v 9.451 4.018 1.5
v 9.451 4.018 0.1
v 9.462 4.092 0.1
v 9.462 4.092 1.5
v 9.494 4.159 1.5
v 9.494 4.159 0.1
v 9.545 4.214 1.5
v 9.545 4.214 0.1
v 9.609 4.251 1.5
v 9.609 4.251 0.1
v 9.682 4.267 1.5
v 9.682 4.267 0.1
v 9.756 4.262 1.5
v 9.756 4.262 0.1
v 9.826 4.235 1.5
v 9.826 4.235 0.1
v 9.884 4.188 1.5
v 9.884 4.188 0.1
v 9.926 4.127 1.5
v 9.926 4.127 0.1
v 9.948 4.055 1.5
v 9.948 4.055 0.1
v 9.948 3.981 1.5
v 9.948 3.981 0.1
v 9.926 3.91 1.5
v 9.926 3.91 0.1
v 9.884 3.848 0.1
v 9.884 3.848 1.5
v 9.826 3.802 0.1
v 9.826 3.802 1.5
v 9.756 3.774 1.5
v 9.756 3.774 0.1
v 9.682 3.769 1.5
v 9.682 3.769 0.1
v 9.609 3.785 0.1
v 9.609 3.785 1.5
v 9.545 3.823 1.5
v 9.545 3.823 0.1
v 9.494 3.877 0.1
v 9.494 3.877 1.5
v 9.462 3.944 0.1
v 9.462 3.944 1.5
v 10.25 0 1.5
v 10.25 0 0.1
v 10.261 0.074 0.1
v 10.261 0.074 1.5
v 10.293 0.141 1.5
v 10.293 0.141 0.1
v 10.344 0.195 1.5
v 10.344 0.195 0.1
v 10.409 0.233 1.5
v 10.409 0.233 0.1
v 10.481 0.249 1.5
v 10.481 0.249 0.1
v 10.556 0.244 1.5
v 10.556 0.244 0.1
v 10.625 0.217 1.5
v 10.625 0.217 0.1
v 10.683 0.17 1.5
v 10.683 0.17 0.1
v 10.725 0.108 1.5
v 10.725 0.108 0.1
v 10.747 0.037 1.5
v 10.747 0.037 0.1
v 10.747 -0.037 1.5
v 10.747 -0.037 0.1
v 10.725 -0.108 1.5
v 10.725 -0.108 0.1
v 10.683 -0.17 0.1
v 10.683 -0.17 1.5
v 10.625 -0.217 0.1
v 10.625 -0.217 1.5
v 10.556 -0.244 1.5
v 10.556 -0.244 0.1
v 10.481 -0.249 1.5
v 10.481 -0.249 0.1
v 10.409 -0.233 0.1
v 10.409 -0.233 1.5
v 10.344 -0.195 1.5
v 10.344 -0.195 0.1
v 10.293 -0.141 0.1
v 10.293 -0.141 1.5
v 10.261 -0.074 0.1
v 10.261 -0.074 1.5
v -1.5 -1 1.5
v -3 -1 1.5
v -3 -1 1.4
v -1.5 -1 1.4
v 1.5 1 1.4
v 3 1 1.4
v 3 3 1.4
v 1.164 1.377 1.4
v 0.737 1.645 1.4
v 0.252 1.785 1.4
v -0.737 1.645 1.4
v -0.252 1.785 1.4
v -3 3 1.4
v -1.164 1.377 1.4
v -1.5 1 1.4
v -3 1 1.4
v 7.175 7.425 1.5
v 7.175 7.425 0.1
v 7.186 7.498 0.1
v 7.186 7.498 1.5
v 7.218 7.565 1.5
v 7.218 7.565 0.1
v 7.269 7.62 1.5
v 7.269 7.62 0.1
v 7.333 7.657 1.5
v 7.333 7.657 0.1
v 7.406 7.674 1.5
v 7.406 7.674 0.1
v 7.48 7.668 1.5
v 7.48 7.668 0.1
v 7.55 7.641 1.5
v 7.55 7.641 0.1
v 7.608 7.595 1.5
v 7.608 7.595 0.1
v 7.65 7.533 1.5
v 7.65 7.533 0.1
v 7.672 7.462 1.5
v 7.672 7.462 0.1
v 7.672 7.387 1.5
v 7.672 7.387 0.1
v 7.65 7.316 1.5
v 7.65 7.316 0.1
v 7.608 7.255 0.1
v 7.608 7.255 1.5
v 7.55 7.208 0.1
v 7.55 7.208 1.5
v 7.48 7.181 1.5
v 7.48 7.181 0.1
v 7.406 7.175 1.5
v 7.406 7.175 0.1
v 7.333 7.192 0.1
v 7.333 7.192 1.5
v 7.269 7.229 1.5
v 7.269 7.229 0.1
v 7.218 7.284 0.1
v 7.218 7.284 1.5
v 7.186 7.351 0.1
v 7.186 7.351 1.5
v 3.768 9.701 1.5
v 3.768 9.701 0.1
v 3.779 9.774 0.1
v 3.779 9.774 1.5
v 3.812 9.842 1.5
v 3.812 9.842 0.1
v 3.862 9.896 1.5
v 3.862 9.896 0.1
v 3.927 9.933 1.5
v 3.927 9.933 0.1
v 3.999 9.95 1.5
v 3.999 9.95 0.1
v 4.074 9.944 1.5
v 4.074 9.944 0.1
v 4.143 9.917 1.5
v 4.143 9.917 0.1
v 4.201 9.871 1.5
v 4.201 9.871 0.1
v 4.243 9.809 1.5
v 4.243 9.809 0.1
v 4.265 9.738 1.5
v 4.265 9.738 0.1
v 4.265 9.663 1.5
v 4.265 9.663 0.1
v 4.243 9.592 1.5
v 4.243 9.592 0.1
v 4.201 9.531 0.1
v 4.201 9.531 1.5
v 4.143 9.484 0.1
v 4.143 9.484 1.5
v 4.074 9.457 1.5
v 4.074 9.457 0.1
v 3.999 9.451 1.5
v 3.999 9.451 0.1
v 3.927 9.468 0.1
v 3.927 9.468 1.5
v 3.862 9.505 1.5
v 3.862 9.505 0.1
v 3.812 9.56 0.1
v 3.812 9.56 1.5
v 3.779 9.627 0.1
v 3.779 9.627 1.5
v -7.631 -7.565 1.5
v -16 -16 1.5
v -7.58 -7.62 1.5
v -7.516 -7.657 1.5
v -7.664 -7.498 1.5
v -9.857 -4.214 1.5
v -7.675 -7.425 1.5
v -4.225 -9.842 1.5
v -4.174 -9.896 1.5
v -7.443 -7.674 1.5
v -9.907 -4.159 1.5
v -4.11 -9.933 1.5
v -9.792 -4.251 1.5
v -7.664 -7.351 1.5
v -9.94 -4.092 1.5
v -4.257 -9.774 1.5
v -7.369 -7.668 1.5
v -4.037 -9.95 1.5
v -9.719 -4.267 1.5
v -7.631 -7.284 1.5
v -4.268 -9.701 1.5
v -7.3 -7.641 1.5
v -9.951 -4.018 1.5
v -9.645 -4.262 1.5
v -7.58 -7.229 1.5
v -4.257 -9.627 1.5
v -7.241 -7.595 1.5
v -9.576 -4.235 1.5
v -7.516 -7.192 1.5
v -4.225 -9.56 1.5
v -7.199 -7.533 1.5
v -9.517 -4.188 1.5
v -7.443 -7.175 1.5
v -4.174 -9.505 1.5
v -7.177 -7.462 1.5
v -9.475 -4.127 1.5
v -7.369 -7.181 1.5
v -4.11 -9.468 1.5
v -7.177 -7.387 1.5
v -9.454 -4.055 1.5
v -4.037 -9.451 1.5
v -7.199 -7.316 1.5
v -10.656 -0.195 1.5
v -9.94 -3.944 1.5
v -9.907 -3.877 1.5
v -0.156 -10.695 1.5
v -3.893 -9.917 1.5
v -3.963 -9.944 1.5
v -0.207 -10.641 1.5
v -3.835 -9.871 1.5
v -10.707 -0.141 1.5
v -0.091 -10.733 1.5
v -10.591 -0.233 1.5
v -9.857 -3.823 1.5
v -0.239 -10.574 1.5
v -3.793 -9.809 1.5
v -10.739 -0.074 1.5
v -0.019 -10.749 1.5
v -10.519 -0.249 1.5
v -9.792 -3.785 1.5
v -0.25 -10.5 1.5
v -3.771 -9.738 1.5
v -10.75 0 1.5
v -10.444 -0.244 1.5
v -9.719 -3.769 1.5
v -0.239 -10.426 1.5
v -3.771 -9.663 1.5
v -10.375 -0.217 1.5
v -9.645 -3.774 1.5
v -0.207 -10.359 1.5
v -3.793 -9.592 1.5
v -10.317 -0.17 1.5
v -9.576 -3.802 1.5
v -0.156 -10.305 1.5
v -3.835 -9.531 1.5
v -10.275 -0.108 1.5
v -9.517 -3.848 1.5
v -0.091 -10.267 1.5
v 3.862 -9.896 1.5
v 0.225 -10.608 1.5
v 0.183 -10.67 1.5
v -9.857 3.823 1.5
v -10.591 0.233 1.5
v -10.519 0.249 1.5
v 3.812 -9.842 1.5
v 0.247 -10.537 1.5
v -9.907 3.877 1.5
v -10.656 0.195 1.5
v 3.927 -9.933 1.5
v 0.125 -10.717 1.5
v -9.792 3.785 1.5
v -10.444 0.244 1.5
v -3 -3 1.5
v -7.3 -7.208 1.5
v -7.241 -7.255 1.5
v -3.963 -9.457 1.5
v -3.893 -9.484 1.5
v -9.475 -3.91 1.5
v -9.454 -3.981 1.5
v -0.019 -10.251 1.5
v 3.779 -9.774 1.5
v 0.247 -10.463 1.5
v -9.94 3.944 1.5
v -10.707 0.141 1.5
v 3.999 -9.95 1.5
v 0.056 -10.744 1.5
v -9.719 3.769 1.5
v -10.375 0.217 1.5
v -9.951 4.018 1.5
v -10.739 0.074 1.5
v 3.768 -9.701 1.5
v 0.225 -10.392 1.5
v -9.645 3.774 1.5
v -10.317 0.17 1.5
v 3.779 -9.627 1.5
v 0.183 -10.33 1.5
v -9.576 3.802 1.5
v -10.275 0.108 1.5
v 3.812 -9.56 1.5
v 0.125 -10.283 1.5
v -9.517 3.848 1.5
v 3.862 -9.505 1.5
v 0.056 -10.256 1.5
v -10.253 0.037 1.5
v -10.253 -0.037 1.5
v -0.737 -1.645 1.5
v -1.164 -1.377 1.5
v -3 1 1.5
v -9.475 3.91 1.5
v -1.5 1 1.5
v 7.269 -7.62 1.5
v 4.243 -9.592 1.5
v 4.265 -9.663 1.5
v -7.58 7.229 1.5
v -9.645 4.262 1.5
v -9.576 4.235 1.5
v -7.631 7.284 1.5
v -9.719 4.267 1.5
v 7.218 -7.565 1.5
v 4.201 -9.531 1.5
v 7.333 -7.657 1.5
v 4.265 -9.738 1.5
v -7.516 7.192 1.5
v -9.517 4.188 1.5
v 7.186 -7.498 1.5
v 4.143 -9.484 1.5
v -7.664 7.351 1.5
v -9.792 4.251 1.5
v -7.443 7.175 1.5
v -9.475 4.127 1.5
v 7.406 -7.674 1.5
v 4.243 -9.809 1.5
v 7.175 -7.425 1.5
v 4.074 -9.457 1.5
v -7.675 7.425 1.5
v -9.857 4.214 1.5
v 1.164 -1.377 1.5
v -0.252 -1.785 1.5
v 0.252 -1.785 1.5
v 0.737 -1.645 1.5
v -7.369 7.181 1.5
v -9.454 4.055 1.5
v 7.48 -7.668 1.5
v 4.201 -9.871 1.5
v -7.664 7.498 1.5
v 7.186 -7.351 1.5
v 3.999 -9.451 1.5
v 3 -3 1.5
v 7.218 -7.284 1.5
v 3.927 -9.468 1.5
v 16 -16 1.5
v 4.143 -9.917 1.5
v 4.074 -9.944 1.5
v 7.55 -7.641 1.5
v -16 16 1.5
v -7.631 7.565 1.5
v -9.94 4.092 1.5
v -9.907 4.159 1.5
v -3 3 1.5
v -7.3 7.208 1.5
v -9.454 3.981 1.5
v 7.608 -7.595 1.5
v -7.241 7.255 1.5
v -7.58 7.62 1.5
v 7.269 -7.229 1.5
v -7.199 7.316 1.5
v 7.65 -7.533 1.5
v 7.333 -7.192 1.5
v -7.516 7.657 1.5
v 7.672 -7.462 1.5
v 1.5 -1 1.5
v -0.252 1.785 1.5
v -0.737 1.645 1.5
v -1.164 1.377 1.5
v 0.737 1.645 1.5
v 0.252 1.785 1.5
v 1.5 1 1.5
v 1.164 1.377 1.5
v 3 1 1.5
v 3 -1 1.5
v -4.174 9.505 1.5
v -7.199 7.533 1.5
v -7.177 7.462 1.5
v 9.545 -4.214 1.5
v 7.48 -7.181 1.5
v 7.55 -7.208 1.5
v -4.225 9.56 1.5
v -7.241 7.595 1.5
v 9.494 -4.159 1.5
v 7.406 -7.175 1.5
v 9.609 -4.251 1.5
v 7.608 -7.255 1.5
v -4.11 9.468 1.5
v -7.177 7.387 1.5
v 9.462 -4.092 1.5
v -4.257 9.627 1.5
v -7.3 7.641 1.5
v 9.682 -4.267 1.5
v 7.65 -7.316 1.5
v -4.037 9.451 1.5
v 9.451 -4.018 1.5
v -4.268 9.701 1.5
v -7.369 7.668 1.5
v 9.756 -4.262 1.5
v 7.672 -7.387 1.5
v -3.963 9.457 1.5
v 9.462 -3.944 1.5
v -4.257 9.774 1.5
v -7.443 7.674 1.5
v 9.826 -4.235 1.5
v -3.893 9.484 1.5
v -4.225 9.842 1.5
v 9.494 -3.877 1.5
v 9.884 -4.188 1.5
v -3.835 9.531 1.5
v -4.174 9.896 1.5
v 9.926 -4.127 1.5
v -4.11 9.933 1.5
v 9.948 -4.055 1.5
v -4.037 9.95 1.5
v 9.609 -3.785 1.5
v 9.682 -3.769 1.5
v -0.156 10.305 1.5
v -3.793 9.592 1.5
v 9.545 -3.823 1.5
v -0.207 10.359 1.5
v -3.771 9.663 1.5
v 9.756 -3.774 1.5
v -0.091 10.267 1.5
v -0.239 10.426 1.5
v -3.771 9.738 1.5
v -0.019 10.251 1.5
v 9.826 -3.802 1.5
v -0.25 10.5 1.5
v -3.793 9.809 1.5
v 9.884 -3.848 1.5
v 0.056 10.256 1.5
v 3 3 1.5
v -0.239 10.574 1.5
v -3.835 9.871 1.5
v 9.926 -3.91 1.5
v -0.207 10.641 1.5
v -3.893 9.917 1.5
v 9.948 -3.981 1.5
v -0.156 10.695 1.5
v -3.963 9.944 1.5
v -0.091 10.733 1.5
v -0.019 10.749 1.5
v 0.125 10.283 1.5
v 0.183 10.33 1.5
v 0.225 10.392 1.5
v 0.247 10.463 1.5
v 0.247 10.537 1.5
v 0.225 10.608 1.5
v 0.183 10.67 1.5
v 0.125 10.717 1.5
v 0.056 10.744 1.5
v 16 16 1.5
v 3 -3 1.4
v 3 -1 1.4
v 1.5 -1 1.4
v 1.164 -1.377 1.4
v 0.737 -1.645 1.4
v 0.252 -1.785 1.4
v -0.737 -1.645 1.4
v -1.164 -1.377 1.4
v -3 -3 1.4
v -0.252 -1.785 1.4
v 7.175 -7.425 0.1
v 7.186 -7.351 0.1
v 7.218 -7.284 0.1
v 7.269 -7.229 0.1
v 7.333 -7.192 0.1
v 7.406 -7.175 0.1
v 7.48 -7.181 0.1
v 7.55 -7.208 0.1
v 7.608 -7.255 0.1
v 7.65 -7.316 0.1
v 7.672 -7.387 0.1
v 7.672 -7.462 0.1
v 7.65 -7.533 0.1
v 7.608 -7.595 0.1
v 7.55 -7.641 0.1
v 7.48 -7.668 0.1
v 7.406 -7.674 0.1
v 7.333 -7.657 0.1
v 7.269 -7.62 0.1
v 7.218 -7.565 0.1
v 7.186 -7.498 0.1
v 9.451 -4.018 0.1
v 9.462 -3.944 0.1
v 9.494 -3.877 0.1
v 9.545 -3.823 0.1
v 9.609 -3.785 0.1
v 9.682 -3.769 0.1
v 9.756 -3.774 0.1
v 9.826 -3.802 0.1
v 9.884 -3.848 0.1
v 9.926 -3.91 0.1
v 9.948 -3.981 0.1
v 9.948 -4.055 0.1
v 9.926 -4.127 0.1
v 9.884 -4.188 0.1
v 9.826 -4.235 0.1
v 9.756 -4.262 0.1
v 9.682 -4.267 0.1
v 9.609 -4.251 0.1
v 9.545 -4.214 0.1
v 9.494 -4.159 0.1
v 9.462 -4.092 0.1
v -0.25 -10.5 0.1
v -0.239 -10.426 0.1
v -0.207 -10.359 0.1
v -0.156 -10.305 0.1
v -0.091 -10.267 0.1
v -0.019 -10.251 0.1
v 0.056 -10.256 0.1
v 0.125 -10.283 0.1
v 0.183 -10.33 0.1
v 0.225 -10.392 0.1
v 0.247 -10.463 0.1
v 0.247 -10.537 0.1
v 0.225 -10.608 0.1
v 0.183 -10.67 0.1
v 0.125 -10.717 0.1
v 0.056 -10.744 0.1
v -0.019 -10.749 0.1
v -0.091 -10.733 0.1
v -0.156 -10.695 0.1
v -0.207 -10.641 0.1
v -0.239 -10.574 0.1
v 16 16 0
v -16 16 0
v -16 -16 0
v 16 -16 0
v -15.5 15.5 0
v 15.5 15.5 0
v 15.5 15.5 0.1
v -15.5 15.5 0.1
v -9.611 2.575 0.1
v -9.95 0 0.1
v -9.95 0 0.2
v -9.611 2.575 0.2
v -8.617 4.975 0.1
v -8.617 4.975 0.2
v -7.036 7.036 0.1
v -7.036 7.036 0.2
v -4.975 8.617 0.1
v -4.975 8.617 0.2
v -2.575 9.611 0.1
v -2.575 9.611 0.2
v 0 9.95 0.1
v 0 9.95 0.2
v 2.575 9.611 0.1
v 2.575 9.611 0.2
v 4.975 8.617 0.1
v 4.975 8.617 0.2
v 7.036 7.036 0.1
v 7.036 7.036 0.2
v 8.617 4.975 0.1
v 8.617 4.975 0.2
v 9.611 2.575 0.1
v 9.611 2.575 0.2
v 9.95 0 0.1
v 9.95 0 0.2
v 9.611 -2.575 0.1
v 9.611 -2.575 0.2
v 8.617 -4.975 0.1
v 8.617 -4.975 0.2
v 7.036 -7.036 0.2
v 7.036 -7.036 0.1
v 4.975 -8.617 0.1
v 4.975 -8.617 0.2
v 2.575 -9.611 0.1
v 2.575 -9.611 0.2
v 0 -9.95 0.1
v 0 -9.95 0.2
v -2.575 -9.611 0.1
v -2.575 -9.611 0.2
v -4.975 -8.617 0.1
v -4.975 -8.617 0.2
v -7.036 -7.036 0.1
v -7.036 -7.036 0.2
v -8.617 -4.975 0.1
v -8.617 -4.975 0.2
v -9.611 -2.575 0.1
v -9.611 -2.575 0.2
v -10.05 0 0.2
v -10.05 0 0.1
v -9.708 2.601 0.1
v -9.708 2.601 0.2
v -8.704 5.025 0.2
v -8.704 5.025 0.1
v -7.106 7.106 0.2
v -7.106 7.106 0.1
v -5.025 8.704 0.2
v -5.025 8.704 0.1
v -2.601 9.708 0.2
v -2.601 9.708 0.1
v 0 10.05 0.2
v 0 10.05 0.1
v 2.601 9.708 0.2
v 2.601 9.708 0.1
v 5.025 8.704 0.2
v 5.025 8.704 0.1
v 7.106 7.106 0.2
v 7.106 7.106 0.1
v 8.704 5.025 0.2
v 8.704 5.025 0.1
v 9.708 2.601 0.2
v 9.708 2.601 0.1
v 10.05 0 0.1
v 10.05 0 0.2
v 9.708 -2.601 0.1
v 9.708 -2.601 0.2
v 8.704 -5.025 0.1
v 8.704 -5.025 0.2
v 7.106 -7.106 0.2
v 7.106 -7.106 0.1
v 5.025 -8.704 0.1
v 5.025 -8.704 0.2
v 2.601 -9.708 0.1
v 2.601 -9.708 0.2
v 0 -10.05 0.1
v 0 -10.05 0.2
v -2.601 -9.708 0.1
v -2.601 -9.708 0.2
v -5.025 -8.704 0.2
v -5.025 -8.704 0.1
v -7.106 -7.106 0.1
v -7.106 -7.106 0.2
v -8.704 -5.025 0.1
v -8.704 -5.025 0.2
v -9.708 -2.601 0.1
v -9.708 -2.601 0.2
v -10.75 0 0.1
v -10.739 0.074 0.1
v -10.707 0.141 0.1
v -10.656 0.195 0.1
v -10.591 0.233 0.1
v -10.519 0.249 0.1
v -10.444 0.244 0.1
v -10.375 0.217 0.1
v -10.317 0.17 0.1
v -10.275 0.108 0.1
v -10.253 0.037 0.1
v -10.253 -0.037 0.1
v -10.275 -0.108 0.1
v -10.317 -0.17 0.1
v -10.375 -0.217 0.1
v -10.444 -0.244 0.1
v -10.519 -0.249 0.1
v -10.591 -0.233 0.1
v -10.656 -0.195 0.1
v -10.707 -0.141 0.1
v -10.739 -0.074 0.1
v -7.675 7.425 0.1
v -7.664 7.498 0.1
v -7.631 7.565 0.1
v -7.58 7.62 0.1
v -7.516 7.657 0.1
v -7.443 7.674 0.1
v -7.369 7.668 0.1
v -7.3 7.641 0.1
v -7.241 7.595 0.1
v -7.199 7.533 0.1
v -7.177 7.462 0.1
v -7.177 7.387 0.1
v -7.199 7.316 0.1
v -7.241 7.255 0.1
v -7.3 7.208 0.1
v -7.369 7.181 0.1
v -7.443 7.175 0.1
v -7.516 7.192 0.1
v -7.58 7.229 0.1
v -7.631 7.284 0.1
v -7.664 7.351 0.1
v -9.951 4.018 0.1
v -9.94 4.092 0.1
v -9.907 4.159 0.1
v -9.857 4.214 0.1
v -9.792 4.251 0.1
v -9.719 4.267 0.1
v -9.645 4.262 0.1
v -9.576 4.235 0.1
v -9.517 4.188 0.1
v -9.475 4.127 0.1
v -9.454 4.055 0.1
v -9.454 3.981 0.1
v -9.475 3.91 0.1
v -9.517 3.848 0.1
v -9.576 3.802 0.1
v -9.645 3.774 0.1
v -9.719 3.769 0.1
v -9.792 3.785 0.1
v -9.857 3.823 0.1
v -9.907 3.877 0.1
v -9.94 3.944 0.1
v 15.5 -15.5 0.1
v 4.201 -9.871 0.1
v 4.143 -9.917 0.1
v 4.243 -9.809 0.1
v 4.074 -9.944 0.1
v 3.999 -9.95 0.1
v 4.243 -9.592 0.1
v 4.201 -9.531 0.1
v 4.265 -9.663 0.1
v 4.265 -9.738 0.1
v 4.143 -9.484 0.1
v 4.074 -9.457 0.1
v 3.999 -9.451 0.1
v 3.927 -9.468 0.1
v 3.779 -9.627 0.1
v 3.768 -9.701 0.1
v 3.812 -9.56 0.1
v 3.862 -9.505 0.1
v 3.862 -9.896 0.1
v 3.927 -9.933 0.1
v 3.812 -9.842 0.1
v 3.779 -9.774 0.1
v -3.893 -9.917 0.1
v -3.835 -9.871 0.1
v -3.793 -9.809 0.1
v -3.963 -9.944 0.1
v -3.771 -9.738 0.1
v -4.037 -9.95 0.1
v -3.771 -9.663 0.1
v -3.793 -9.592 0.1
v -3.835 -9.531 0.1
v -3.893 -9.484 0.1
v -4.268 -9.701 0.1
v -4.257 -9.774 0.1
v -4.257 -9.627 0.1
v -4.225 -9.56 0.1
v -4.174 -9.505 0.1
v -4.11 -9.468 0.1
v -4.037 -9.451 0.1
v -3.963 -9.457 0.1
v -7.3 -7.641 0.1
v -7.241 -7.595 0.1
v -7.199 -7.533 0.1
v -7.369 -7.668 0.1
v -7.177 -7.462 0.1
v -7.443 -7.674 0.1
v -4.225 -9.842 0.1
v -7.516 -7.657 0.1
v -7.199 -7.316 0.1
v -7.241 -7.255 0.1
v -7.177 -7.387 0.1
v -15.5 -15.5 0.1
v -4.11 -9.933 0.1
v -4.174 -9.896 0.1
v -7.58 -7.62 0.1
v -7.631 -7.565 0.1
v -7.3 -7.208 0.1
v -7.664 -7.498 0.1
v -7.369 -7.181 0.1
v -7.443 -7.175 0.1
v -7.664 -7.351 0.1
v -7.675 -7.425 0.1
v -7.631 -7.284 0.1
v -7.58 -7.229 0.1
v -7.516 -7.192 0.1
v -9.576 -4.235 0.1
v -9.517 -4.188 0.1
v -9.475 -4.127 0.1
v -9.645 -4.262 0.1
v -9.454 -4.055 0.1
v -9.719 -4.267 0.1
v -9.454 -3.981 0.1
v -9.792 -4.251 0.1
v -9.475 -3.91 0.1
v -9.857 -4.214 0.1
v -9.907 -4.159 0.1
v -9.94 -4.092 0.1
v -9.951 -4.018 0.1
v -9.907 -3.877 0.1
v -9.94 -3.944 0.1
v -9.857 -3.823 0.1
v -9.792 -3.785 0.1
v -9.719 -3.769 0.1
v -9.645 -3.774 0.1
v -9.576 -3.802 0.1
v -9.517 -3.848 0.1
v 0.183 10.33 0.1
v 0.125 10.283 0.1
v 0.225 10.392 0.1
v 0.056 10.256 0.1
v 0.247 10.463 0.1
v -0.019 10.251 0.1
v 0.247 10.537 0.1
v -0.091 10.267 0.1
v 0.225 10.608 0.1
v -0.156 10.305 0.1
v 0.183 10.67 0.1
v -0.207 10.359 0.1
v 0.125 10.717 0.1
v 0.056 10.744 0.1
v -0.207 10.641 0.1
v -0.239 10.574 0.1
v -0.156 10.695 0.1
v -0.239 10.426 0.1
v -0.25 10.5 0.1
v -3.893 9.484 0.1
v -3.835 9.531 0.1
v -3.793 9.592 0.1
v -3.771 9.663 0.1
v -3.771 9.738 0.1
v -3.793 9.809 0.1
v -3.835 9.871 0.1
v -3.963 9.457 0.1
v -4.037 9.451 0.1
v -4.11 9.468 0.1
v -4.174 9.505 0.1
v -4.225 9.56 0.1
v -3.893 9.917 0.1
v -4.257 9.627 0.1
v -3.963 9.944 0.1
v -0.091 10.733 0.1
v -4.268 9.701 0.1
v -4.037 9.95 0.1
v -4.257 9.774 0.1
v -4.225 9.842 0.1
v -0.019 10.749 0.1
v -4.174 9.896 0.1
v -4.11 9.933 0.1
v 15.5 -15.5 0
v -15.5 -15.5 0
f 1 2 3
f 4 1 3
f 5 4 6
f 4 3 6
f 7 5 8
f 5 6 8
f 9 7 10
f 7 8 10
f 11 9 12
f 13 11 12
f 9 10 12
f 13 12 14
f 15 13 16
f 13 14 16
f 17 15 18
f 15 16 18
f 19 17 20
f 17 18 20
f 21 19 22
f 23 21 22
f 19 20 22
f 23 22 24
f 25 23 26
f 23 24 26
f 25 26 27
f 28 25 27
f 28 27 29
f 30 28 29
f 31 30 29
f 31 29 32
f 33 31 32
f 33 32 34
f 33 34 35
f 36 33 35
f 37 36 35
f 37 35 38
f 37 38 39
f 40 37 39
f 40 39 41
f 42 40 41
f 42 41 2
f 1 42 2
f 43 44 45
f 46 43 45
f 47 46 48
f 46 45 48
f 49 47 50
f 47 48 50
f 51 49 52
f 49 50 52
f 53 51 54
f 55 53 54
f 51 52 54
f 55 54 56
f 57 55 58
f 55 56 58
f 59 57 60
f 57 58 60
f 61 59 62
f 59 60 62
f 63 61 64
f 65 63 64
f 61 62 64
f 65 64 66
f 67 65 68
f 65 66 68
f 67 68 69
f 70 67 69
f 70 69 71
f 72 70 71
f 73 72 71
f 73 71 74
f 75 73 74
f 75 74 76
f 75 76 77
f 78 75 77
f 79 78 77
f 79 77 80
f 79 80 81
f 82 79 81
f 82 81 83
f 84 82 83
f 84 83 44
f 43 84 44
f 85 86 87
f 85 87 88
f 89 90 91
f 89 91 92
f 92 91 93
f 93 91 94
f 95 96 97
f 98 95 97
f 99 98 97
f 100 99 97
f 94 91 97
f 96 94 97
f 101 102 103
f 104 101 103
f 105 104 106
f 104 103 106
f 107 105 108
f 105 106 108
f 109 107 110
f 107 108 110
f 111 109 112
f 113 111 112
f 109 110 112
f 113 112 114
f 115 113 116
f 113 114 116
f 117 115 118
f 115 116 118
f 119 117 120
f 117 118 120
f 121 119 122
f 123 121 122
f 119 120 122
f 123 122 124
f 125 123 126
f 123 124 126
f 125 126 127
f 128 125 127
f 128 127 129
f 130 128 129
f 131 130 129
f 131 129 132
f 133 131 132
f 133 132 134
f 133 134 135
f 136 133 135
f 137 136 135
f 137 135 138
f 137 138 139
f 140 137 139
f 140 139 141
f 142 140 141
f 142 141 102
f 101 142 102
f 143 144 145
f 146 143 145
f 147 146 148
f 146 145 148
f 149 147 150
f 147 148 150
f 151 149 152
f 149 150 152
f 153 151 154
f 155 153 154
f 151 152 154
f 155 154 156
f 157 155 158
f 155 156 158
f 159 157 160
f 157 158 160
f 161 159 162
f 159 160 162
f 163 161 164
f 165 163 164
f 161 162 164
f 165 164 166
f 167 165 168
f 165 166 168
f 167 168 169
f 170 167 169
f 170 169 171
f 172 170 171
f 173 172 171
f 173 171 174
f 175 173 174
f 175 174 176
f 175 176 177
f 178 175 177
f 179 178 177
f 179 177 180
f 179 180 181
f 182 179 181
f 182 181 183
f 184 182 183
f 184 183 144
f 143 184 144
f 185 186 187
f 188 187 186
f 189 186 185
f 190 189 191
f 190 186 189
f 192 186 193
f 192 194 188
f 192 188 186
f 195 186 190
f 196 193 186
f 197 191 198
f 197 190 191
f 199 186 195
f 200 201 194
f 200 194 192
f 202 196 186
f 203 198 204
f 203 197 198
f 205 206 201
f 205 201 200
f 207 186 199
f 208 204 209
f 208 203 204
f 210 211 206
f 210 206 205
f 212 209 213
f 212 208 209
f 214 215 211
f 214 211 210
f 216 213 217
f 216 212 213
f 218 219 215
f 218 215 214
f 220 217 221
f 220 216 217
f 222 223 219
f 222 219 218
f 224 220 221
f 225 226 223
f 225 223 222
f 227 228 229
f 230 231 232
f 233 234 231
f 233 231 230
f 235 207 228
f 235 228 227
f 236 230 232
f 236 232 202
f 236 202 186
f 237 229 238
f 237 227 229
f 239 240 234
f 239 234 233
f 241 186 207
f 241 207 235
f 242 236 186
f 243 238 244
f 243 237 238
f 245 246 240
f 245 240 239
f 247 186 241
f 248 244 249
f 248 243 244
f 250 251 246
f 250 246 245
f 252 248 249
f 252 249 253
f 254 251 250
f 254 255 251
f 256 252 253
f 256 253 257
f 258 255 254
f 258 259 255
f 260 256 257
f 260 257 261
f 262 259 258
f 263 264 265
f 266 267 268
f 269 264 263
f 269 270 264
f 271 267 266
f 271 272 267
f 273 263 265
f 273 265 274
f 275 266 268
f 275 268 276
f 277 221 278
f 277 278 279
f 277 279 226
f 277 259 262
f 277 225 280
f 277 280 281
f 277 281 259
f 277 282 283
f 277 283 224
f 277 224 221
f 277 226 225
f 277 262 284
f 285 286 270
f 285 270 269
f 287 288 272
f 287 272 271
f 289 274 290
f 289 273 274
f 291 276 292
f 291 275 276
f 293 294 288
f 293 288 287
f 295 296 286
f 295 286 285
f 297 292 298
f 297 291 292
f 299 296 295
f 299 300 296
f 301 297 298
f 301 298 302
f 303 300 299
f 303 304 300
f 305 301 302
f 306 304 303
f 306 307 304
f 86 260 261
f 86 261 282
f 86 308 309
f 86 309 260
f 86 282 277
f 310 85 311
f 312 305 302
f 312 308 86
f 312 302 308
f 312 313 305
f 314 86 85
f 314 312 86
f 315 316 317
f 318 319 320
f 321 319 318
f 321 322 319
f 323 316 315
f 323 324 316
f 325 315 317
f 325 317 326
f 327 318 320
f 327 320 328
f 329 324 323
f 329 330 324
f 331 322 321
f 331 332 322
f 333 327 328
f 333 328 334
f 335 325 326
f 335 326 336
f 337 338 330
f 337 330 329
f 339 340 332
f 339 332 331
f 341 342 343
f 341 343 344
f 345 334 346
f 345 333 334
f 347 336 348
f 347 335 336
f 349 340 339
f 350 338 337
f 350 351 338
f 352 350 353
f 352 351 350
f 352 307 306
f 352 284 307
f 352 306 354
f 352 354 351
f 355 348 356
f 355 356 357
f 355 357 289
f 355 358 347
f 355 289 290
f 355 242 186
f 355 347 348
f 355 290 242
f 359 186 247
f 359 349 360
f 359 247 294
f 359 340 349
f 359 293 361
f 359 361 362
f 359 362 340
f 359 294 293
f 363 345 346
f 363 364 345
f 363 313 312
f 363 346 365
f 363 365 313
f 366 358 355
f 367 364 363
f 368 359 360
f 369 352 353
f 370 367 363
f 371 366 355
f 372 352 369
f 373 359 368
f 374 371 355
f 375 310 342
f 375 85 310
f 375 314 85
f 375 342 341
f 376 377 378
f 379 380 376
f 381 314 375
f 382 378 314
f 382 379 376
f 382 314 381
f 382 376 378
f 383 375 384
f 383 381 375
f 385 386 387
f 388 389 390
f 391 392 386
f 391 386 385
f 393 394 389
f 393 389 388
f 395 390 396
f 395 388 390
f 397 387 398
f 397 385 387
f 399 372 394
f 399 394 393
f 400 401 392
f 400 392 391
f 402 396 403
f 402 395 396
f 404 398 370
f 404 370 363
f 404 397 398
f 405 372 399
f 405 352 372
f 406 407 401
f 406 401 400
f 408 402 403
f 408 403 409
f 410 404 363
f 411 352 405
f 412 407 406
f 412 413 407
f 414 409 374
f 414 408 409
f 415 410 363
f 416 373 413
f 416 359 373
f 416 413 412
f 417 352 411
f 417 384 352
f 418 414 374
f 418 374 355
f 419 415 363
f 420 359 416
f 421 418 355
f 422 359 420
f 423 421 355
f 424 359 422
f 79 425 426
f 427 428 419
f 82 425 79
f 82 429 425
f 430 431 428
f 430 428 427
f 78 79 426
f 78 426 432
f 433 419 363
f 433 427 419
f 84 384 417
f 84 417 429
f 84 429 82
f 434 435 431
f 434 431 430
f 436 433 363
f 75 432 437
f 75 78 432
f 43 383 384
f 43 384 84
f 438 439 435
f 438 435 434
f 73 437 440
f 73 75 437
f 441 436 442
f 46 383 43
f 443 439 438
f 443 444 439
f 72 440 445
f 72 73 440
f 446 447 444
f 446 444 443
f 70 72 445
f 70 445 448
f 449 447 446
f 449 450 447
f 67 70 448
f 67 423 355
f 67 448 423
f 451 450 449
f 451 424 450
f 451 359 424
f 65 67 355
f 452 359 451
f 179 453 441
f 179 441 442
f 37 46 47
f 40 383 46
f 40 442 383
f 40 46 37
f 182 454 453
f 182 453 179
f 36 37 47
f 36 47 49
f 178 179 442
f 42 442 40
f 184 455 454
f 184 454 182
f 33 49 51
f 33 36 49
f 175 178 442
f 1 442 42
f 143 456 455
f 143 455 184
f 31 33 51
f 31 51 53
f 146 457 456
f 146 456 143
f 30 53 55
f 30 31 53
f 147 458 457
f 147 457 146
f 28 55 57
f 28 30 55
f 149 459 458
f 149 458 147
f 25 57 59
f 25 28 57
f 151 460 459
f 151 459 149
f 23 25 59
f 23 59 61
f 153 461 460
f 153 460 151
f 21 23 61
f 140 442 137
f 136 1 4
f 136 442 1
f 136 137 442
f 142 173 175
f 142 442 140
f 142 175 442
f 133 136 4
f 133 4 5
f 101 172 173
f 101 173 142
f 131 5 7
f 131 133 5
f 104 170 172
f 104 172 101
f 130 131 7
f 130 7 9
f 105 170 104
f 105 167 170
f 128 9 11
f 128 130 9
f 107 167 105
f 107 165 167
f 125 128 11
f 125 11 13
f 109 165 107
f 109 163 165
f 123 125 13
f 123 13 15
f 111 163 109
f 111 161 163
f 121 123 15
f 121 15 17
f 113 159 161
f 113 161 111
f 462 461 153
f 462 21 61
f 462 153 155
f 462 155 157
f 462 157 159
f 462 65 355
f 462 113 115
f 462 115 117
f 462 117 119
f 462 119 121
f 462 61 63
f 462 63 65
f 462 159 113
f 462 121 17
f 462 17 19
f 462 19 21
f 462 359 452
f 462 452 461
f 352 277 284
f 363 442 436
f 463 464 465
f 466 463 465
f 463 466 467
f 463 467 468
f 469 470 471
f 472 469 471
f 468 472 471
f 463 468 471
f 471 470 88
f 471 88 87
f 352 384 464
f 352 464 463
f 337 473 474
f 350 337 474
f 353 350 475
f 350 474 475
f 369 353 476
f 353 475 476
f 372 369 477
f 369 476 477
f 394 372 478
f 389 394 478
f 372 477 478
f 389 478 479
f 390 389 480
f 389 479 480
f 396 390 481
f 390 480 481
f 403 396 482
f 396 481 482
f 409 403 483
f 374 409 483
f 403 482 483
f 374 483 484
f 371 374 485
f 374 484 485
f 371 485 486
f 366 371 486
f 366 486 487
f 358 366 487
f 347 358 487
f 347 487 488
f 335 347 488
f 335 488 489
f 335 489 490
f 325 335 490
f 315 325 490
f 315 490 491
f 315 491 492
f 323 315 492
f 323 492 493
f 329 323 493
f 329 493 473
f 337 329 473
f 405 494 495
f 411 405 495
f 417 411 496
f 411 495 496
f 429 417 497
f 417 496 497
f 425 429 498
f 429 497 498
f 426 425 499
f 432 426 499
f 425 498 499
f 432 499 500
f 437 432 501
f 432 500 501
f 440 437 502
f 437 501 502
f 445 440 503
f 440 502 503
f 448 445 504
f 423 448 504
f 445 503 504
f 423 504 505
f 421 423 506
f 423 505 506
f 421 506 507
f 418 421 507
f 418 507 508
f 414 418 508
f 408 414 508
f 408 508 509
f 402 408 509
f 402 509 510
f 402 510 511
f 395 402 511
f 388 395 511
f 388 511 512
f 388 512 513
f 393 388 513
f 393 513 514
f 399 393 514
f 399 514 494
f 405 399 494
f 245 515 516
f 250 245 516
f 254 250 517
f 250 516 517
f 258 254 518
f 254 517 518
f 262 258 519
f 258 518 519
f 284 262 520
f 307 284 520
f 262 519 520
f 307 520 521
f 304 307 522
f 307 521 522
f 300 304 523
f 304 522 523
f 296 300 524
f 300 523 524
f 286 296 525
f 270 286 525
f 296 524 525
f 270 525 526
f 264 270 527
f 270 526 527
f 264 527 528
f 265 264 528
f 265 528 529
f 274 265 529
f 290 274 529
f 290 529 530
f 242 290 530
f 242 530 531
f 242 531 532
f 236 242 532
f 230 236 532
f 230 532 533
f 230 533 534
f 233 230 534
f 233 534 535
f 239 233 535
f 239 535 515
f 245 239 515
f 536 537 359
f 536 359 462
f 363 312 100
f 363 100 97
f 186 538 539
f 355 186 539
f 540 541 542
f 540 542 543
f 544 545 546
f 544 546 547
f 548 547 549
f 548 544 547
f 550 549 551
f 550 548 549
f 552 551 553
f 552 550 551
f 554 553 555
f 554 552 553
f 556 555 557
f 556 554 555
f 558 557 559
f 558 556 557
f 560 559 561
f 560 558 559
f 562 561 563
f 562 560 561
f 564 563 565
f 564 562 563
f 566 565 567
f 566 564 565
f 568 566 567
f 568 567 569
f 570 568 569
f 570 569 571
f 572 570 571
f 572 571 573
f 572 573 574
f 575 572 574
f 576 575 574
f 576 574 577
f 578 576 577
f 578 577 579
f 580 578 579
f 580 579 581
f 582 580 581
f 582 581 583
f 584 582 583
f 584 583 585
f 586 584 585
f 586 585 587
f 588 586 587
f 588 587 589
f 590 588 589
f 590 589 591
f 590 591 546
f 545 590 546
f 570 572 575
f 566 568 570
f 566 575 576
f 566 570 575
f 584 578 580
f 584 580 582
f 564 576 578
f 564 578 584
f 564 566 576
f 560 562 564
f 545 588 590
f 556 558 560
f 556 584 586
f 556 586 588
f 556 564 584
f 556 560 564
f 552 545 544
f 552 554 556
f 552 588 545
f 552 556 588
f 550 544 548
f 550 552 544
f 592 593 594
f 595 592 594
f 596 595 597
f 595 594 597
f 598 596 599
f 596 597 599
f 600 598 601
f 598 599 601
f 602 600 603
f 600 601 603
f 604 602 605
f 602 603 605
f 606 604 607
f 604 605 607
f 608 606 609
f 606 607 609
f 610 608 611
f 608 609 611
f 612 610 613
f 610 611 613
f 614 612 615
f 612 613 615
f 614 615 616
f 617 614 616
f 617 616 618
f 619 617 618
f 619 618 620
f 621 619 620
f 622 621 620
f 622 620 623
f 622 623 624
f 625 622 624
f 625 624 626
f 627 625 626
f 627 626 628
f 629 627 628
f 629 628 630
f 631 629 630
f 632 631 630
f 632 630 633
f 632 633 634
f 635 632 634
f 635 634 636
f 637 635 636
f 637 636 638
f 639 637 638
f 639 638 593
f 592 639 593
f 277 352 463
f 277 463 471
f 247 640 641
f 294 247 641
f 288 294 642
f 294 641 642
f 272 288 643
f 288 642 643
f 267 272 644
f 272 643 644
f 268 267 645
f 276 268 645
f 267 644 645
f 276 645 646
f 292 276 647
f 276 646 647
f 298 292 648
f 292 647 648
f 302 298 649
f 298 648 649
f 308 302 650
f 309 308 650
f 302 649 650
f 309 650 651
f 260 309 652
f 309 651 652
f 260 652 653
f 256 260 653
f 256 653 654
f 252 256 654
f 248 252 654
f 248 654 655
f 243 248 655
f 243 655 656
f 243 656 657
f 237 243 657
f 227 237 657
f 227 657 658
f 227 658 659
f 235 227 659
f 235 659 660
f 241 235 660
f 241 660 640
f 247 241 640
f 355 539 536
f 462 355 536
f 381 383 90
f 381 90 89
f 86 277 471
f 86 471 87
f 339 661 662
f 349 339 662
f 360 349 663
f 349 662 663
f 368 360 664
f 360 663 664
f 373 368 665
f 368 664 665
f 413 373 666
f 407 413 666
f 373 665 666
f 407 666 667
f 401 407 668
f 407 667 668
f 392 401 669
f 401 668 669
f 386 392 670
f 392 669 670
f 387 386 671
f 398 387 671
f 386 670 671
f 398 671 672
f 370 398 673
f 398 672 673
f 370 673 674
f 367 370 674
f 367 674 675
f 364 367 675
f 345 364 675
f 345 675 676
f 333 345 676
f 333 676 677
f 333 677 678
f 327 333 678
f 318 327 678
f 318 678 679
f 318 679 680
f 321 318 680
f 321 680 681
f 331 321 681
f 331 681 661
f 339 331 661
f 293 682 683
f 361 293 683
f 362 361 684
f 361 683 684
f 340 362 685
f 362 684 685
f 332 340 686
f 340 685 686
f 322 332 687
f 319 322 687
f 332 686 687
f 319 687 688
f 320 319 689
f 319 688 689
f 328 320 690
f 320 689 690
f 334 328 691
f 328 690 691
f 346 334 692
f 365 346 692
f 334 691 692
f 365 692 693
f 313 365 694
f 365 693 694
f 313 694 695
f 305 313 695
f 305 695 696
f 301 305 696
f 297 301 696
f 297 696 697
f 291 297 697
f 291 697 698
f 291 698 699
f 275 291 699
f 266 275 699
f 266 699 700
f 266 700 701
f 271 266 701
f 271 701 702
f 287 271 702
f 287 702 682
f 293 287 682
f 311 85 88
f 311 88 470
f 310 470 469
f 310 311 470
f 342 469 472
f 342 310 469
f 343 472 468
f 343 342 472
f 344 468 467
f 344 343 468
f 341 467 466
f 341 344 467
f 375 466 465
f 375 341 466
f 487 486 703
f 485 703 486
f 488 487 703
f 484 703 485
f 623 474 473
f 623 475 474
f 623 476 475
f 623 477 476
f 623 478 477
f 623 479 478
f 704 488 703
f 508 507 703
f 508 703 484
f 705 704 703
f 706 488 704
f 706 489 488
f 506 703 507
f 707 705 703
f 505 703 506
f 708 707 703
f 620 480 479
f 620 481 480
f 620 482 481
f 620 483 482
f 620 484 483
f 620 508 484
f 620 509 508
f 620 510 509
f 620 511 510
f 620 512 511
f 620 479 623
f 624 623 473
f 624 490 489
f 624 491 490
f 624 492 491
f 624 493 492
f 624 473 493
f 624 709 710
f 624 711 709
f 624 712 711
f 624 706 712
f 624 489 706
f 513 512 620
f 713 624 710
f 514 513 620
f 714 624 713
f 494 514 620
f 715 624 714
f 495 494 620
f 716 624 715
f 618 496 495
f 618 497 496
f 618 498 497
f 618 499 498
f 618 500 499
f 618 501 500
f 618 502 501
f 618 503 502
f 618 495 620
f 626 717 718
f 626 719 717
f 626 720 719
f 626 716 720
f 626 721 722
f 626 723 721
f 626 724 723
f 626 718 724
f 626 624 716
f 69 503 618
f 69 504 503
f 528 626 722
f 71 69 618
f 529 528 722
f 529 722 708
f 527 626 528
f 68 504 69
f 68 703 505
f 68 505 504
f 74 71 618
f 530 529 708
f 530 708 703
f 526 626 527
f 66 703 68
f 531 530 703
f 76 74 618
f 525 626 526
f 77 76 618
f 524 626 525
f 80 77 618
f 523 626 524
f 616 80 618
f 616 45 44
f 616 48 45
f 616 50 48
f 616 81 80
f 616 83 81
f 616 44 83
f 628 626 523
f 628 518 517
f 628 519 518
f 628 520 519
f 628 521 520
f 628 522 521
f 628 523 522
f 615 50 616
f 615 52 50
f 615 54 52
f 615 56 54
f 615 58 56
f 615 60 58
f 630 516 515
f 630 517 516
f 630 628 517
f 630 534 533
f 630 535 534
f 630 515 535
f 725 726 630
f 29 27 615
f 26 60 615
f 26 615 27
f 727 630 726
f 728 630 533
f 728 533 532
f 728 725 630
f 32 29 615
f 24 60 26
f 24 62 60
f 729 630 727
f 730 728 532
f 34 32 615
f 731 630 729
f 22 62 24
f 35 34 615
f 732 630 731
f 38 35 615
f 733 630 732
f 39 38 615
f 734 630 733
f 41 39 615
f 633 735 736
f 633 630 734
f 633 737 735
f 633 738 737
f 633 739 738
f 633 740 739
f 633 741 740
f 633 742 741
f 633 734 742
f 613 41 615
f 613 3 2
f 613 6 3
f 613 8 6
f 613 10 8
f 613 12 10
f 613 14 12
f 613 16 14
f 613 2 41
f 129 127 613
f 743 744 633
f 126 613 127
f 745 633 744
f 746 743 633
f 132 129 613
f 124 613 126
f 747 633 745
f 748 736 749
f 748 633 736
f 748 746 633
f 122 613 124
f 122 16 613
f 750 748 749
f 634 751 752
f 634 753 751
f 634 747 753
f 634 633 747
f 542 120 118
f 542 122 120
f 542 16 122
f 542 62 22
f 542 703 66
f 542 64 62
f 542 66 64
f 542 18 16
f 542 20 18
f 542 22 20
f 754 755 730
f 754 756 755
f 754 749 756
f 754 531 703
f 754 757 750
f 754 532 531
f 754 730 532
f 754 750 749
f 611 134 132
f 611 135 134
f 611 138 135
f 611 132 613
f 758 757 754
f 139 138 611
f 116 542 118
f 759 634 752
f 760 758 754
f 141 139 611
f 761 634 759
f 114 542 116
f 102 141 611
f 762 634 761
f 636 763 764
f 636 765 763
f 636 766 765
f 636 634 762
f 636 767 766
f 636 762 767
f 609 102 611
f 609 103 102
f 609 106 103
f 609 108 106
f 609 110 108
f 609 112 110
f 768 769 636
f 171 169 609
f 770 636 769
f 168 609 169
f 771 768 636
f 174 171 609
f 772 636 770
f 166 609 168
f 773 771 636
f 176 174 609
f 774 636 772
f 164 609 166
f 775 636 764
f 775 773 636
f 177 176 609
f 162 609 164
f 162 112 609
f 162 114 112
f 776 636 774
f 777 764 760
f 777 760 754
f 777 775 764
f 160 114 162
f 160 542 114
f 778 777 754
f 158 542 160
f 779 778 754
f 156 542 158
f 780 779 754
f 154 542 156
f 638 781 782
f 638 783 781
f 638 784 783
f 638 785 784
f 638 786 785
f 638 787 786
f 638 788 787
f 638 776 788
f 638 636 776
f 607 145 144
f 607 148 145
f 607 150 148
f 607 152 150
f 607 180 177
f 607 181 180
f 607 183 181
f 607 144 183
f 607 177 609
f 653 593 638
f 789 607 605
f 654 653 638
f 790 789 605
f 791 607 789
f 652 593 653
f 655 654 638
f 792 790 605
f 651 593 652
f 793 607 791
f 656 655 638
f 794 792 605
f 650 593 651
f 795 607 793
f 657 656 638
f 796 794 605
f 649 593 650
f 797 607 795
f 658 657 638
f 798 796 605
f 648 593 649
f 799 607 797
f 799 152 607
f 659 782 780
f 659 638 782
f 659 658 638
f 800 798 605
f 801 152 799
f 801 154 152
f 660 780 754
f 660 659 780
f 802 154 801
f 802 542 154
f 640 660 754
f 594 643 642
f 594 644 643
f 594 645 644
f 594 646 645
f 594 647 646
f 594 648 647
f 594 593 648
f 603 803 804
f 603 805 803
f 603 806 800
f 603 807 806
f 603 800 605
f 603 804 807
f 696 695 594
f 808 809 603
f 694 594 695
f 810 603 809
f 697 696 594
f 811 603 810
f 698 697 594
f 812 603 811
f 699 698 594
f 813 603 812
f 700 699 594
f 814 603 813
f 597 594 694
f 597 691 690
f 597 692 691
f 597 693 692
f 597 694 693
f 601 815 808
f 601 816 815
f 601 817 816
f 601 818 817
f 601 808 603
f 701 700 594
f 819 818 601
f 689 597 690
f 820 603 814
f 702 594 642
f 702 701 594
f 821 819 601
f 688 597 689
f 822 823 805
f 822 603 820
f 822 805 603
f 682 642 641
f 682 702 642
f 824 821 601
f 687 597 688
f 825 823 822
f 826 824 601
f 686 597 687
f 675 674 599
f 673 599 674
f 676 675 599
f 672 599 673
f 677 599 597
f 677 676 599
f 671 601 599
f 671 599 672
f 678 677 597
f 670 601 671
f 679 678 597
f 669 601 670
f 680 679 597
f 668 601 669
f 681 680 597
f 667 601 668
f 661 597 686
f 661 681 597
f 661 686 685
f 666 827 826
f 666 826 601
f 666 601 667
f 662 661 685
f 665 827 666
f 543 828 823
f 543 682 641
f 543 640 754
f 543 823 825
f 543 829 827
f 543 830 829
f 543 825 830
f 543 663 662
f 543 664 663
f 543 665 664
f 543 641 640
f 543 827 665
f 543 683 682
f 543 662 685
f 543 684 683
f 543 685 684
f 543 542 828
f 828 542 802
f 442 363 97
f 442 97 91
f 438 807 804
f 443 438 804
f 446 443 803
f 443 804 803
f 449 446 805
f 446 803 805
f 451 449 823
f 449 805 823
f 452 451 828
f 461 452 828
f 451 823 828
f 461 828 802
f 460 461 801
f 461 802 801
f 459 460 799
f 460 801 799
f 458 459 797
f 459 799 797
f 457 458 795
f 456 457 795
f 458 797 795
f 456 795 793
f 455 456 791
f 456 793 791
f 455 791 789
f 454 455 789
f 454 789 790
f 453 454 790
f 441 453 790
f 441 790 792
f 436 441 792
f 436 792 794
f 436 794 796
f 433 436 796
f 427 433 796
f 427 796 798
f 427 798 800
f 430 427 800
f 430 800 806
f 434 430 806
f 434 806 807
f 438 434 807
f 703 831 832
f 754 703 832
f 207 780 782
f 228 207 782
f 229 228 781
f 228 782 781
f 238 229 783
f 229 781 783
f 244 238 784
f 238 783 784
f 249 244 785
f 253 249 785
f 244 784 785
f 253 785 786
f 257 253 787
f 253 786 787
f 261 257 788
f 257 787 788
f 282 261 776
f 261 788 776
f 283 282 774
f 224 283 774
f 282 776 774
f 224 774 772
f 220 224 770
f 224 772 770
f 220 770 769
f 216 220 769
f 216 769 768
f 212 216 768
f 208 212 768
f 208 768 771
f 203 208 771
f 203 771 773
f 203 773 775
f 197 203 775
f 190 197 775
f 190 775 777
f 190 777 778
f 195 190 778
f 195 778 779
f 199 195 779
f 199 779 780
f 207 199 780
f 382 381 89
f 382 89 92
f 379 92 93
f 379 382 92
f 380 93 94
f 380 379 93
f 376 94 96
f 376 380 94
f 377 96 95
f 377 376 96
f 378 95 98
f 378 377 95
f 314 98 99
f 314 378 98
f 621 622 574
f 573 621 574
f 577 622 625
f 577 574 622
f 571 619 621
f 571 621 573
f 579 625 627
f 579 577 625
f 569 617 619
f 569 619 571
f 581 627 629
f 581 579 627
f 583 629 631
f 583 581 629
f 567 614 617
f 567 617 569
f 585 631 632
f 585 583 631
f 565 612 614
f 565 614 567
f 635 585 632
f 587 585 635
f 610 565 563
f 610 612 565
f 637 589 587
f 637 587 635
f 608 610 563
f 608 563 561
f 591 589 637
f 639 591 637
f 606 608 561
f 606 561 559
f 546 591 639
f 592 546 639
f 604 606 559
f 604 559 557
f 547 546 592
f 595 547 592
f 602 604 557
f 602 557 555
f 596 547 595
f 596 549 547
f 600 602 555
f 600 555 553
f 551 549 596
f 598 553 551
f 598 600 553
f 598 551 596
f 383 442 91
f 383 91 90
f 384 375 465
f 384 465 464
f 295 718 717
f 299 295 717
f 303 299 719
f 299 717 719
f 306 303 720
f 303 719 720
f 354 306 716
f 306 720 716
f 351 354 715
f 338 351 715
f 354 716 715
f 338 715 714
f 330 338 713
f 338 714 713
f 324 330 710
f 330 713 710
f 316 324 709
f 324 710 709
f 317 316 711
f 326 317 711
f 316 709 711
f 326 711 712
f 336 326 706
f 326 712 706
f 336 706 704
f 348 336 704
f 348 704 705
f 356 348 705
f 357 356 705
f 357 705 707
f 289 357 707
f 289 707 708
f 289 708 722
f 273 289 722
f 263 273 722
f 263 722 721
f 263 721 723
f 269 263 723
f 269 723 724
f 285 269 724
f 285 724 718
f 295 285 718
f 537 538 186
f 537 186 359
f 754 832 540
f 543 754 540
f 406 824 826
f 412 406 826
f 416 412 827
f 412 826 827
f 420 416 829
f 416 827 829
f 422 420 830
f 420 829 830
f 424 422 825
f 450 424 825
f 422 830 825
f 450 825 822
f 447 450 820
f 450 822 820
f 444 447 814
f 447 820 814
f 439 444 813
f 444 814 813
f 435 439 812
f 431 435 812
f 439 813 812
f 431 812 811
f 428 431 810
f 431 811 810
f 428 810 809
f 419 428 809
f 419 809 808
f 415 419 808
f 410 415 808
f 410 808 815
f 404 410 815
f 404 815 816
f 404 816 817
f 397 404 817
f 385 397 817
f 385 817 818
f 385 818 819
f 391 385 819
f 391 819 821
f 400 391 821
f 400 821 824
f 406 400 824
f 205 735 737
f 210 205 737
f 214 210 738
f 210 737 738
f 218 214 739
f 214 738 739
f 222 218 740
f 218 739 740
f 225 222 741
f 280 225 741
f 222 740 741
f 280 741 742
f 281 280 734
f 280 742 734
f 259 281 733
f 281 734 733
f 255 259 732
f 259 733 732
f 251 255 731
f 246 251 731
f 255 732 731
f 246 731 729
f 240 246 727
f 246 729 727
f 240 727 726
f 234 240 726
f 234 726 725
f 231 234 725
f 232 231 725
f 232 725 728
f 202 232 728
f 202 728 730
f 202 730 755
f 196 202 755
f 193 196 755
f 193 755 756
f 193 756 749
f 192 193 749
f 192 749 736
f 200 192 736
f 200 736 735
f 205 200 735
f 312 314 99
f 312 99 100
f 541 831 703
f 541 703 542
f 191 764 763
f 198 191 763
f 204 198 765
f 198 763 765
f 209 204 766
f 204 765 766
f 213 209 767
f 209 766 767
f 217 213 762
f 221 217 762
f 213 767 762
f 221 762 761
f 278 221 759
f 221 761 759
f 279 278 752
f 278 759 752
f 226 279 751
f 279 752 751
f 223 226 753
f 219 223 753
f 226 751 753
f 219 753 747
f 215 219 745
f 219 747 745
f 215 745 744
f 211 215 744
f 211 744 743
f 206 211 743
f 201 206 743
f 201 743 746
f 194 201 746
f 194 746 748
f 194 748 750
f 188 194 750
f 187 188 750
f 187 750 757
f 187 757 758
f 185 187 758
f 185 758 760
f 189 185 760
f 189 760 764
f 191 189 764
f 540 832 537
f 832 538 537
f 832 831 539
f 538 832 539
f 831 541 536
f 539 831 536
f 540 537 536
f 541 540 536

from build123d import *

# Parameters (mm, degrees)
ESQUISSE1_W             = 32
ESQUISSE1_H             = 32
BOSS_EXTRU_1_DEPTH      = 1.5
ESQUISSE2_R             = 10.05
ESQUISSE2_R_2           = 9.95
ENL_V_MAT_EXTRU_1_DEPTH = 0.2
ESQUISSE3_R             = 0.25
ENL_V_MAT_EXTRU_2_DEPTH = 2.5
ESQUISSE4_W             = 31
ESQUISSE4_H             = 31
ENL_V_MAT_EXTRU_3_DEPTH = 0.1
ENL_V_MAT_EXTRU_4_DEPTH = 0.1


with BuildPart() as part:
    # Esquisse1 → Boss.-Extru.1 (new body)
    with BuildSketch(Plane.XY):
        Rectangle(ESQUISSE1_W, ESQUISSE1_H)
    extrude(amount=BOSS_EXTRU_1_DEPTH)

    # Esquisse2 → Enlèv. mat.-Extru.1 (cut)
    with BuildSketch(Plane(origin=(0, 0, 0), x_dir=(-1, 0, 0), z_dir=(0, 0, -1))):
        Circle(ESQUISSE2_R)
        Circle(ESQUISSE2_R_2, mode=Mode.SUBTRACT)
    extrude(amount=-ENL_V_MAT_EXTRU_1_DEPTH, mode=Mode.SUBTRACT)

    # Esquisse3 → Enlèv. mat.-Extru.2 (cut, through all)
    with BuildSketch(Plane(origin=(0, 0, 0), x_dir=(-1, 0, 0), z_dir=(0, 0, -1))):
        with Locations((0, 10.5)):
            Circle(ESQUISSE3_R)
        with Locations((4.01817604, 9.700735091)):
            Circle(ESQUISSE3_R)
        with Locations((7.424621202, 7.424621202)):
            Circle(ESQUISSE3_R)
        with Locations((9.700735091, 4.01817604)):
            Circle(ESQUISSE3_R)
        with Locations((10.5, 0)):
            Circle(ESQUISSE3_R)
        with Locations((9.700735091, -4.01817604)):
            Circle(ESQUISSE3_R)
        with Locations((7.424621202, -7.424621202)):
            Circle(ESQUISSE3_R)
        with Locations((4.01817604, -9.700735091)):
            Circle(ESQUISSE3_R)
        with Locations((0, -10.5)):
            Circle(ESQUISSE3_R)
        with Locations((-4.01817604, -9.700735091)):
            Circle(ESQUISSE3_R)
        with Locations((-7.424621202, -7.424621202)):
            Circle(ESQUISSE3_R)
        with Locations((-9.700735091, -4.01817604)):
            Circle(ESQUISSE3_R)
        with Locations((-10.5, 0)):
            Circle(ESQUISSE3_R)
        with Locations((-9.700735091, 4.01817604)):
            Circle(ESQUISSE3_R)
        with Locations((-7.424621202, 7.424621202)):
            Circle(ESQUISSE3_R)
        with Locations((-4.01817604, 9.700735091)):
            Circle(ESQUISSE3_R)
    extrude(amount=-ENL_V_MAT_EXTRU_2_DEPTH, mode=Mode.SUBTRACT)

    # Esquisse4 → Enlèv. mat.-Extru.3 (cut)
    with BuildSketch(Plane(origin=(0, 0, 0), x_dir=(-1, 0, 0), z_dir=(0, 0, -1))):
        Rectangle(ESQUISSE4_W, ESQUISSE4_H)
    extrude(amount=-ENL_V_MAT_EXTRU_3_DEPTH, mode=Mode.SUBTRACT)

    # Esquisse5 → Enlèv. mat.-Extru.4 (cut)
    with BuildSketch(Plane.XY.offset(1.5)):
        with BuildLine():
            Line((-3, 3), (3, 3))
            Line((3, 3), (3, 1))
            Line((3, 1), (1.5, 1))
            ThreePointArc((1.5, 1), (0, 1.802775638), (-1.5, 1))
            Line((-1.5, 1), (-3, 1))
            Line((-3, 1), (-3, 3))
        make_face()
        with BuildLine():
            Line((-3, -3), (-3, -1))
            Line((-3, -1), (-1.5, -1))
            ThreePointArc((-1.5, -1), (0, -1.802775638), (1.5, -1))
            Line((1.5, -1), (3, -1))
            Line((3, -1), (3, -3))
            Line((3, -3), (-3, -3))
        make_face()
    extrude(amount=-ENL_V_MAT_EXTRU_4_DEPTH, mode=Mode.SUBTRACT)


solid = part.part
